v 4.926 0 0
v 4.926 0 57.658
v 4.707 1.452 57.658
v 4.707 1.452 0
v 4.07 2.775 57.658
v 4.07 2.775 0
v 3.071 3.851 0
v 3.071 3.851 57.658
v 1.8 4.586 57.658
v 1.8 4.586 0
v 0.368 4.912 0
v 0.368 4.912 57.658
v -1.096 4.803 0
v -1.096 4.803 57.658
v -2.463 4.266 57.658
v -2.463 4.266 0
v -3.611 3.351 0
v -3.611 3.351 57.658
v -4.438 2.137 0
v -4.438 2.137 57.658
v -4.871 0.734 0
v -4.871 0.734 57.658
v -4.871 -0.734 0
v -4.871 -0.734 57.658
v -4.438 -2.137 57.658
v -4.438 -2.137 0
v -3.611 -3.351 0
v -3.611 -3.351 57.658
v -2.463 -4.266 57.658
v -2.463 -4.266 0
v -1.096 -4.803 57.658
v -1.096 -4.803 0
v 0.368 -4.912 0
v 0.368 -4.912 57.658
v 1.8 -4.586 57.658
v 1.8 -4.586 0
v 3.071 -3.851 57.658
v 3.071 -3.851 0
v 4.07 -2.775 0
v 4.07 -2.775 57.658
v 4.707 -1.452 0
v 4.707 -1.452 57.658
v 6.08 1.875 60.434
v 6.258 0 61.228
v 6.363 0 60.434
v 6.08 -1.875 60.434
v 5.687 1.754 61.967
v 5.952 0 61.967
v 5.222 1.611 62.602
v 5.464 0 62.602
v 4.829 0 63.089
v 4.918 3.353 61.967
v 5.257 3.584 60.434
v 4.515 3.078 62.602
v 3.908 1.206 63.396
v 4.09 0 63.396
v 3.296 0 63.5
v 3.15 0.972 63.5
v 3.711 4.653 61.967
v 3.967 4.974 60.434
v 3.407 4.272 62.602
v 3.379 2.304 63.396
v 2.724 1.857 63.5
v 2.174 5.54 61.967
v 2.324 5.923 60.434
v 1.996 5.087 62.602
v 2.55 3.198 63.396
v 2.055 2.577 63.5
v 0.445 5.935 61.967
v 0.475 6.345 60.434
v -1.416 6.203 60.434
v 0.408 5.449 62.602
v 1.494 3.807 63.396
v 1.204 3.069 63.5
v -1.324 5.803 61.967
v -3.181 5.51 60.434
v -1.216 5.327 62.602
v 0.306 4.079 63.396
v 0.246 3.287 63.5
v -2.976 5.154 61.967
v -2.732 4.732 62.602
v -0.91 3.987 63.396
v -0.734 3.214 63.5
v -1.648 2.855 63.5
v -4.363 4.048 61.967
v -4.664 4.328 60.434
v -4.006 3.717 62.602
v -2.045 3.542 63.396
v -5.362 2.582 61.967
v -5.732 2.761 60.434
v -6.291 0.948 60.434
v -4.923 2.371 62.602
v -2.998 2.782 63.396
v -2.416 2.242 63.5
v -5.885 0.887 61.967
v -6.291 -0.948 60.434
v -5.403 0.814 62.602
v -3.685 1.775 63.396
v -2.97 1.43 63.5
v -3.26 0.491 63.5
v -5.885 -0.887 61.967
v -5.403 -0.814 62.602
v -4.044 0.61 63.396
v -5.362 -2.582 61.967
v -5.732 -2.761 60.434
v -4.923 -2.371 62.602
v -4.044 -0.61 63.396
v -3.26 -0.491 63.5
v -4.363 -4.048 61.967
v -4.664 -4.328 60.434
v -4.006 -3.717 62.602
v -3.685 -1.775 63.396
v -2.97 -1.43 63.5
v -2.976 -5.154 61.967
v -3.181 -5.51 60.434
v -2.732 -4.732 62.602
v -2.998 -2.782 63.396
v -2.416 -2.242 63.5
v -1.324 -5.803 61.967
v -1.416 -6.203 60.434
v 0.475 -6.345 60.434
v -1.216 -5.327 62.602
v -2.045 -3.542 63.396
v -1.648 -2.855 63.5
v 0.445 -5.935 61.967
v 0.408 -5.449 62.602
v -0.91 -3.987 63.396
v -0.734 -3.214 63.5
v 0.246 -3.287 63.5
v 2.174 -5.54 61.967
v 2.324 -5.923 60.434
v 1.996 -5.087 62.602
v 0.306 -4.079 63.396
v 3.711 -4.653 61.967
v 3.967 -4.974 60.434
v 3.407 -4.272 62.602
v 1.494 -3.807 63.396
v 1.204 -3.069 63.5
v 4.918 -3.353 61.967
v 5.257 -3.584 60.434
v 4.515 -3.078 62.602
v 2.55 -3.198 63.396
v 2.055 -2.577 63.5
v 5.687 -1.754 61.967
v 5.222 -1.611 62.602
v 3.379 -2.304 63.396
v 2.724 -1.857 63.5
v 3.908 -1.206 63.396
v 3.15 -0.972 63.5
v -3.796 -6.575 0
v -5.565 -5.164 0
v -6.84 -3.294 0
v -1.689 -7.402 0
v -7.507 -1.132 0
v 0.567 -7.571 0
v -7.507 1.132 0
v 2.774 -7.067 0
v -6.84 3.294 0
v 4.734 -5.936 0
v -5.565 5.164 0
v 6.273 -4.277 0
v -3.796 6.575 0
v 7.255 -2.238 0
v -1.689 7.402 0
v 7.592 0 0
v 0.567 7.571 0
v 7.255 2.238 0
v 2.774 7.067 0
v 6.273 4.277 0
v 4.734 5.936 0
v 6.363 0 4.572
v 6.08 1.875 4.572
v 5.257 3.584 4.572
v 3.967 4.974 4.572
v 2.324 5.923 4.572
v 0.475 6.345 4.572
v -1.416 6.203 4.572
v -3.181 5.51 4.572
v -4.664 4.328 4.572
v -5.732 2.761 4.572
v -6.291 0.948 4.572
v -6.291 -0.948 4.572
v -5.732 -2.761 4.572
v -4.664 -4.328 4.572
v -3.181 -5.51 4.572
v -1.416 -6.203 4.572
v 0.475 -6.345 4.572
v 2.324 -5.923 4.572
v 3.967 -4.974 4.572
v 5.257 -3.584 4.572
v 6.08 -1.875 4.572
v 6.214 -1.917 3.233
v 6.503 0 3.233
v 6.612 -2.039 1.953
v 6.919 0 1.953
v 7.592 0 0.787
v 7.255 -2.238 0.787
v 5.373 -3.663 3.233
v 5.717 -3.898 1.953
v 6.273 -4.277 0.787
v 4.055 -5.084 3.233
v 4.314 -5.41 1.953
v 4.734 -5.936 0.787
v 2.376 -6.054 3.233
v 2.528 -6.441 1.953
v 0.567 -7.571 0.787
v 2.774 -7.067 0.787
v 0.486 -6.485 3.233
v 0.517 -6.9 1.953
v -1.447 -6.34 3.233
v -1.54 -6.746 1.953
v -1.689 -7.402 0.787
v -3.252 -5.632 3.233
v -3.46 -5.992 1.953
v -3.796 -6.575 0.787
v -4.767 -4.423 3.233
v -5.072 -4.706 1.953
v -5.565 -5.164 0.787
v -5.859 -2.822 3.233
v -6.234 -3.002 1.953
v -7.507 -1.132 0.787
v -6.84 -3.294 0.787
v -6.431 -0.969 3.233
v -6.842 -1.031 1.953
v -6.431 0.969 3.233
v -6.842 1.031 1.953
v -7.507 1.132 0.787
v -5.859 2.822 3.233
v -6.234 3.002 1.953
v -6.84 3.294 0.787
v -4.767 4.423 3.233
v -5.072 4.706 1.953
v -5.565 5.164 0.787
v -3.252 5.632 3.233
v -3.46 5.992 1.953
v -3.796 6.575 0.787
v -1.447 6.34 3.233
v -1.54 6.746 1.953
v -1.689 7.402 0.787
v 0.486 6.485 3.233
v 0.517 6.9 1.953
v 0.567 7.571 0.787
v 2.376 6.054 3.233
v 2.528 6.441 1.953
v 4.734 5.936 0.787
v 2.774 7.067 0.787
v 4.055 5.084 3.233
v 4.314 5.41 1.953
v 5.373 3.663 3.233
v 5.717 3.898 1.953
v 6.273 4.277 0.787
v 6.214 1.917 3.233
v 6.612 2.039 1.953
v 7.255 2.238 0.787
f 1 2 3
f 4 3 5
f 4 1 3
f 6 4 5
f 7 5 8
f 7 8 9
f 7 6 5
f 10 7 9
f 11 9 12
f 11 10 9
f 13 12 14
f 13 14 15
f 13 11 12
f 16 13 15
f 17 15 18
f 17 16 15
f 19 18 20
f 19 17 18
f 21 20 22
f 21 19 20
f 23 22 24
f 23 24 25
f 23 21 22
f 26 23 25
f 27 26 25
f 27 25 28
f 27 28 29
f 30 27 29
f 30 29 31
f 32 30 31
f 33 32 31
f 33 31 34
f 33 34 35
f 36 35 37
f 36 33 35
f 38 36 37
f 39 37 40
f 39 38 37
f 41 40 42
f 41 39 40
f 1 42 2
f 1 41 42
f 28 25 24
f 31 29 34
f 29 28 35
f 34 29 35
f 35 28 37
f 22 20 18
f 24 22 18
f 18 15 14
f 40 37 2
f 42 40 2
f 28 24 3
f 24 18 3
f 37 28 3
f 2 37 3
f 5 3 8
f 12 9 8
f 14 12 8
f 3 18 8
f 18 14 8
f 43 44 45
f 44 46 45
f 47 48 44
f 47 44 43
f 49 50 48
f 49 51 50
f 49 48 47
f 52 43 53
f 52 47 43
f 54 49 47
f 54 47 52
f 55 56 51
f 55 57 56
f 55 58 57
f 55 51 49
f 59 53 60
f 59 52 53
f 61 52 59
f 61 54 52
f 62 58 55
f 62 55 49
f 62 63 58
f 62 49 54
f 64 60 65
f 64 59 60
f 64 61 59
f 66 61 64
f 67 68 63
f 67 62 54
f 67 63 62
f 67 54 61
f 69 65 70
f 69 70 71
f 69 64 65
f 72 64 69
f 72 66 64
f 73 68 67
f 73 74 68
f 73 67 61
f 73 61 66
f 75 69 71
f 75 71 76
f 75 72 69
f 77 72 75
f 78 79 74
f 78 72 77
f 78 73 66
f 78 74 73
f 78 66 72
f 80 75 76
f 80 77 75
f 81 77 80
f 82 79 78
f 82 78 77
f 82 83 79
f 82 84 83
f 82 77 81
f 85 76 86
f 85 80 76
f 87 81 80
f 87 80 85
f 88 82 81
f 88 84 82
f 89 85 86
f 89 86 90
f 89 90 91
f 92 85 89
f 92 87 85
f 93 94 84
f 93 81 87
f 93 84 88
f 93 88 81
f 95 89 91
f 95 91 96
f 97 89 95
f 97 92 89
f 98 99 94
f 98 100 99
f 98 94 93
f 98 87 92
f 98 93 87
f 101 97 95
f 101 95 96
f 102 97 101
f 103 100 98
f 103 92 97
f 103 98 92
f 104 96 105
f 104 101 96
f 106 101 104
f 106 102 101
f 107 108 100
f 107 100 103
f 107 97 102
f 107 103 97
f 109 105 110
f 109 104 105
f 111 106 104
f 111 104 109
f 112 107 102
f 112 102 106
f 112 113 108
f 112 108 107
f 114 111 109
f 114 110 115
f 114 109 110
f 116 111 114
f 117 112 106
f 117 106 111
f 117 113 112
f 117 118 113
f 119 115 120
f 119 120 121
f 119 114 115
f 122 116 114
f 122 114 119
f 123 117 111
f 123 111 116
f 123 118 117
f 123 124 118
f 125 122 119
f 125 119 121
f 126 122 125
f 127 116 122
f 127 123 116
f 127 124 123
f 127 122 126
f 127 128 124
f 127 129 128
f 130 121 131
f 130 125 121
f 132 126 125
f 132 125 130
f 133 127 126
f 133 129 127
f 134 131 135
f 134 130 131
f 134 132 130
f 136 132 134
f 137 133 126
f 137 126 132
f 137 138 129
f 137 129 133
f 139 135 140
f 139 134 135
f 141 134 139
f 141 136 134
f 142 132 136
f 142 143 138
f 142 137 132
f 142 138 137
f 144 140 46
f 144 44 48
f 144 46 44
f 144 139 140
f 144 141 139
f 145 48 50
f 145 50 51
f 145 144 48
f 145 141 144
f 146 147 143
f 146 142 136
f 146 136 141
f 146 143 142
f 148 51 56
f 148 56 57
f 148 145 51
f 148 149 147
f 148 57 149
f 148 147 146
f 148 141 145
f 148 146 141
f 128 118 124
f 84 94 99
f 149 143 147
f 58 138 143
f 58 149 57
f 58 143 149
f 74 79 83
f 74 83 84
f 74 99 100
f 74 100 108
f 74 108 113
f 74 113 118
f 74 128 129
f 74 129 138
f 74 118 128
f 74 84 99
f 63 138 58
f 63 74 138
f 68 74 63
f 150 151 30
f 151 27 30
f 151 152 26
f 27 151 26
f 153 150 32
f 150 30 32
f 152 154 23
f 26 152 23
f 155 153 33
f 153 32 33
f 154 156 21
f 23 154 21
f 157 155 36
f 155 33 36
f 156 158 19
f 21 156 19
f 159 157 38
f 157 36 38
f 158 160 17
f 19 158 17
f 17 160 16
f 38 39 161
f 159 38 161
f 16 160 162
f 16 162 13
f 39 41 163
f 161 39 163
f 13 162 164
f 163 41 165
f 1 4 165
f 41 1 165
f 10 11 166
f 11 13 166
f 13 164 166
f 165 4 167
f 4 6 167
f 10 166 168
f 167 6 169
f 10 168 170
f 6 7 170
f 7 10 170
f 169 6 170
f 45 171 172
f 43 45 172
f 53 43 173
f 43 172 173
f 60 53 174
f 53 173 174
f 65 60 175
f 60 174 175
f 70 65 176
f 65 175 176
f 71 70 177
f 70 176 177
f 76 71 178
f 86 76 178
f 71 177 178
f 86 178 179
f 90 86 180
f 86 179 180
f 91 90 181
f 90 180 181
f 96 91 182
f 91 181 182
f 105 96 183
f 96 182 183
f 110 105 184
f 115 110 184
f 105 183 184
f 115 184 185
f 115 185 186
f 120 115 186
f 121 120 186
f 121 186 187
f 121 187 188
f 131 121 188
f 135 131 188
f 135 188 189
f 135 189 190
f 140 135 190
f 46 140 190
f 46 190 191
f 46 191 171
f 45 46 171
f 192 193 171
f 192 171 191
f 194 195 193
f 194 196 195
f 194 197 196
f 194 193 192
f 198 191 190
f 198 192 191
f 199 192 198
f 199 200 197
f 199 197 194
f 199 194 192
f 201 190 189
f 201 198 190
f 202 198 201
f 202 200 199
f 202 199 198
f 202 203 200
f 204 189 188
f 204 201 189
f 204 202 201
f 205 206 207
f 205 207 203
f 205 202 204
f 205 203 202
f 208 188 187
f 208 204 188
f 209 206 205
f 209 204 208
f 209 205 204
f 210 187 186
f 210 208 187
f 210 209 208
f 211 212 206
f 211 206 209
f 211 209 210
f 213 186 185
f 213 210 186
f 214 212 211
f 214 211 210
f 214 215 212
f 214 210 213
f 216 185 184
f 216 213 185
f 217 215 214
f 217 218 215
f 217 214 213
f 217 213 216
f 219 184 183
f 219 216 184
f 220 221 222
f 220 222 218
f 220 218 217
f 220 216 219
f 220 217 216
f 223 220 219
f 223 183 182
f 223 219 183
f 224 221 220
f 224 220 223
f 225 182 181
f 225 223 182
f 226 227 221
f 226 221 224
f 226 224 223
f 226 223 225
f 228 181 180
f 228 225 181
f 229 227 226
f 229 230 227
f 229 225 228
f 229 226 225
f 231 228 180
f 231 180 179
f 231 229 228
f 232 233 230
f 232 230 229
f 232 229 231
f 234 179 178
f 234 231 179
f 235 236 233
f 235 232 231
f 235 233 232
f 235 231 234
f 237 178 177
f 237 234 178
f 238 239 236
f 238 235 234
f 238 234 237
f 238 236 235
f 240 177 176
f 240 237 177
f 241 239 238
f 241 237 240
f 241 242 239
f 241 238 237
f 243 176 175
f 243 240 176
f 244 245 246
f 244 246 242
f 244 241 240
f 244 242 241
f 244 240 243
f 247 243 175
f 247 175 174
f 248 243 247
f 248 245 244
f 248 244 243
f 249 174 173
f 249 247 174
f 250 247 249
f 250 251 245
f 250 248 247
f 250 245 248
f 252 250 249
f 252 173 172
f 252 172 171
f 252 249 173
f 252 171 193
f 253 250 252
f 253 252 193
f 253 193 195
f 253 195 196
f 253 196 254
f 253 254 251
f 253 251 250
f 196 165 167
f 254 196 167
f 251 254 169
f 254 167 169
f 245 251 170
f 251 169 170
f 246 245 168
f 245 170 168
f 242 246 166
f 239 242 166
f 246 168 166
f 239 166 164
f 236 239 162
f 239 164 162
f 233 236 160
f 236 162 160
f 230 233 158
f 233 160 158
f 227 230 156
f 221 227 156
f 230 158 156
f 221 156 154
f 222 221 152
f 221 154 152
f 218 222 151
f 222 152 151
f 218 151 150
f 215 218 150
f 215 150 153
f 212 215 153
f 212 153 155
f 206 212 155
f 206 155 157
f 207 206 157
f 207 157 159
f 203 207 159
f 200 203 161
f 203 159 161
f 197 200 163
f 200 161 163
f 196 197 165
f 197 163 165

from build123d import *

# Parameters (mm, degrees)
F0_R      = 6.3625068229
F1_DEPTH  = 63.5
F2_R      = 4.7646286231
F3_DEPTH  = 25.146
F4_R      = 7.5920691382
F5_DEPTH  = 0.7874
F6_R      = 4.746247259
F7_DEPTH  = 35.306
F8_R      = 3.0660512242
F10_R     = 4.926173209
F11_DEPTH = 57.658


# Not quite as in the source:
# - a fillet or chamfer that OpenCascade refuses, or shapes differently, is made with other operations: its cross-section is extruded or revolved along the edge and cut away or added


with BuildPart() as f1:
    # F0 (on Top) → F1 (new body)
    with BuildSketch(Plane.XY):
        Circle(F0_R)
    extrude(amount=F1_DEPTH)

    # F2 (on face) → F3 (cut)
    with BuildSketch(Plane(origin=(0, 0, 0), x_dir=(1, 0, 0), z_dir=(0, 0, -1))):
        Circle(F2_R)
    extrude(amount=-F3_DEPTH, mode=Mode.SUBTRACT)

    # F4 (on Top) → F5 (join)
    with BuildSketch(Plane.XY):
        Circle(F4_R)
    extrude(amount=F5_DEPTH)

    # F6 (on face) → F7 (cut)
    with BuildSketch(Plane(origin=(0, 0, 0), x_dir=(1, 0, 0), z_dir=(0, 0, -1))):
        Circle(F6_R)
    extrude(amount=-F7_DEPTH, mode=Mode.SUBTRACT)

    # F8
    f8_edges = [f1.edges().sort_by_distance(p)[0] for p in [
        (-6.362507, 0, 63.5),
    ]]
    fillet(f8_edges, radius=F8_R)

    # F9: fillet of radius 6.4387075708 on 1 edges, made by hand

    # F9_s1 → F9_t2 (revolve)
    with BuildSketch(Plane.XZ):
        with BuildLine():
            ThreePointArc((6.3625068229, 4.5718102432), (6.6776076879, 2.5822384064), (7.5920691382, 0.7874))
            Line((7.5920691382, 0.7874), (6.3625068229, 0.7874))
            Line((6.3625068229, 0.7874), (6.3625068229, 4.5718102432))
        make_face()
    revolve(axis=Axis((0, 0, 0.7874), (0, 0, -1)))

    # F10 (on Top) → F11 (cut)
    with BuildSketch(Plane.XY):
        Circle(F10_R)
    extrude(amount=F11_DEPTH, mode=Mode.SUBTRACT)


solid = f1.part
